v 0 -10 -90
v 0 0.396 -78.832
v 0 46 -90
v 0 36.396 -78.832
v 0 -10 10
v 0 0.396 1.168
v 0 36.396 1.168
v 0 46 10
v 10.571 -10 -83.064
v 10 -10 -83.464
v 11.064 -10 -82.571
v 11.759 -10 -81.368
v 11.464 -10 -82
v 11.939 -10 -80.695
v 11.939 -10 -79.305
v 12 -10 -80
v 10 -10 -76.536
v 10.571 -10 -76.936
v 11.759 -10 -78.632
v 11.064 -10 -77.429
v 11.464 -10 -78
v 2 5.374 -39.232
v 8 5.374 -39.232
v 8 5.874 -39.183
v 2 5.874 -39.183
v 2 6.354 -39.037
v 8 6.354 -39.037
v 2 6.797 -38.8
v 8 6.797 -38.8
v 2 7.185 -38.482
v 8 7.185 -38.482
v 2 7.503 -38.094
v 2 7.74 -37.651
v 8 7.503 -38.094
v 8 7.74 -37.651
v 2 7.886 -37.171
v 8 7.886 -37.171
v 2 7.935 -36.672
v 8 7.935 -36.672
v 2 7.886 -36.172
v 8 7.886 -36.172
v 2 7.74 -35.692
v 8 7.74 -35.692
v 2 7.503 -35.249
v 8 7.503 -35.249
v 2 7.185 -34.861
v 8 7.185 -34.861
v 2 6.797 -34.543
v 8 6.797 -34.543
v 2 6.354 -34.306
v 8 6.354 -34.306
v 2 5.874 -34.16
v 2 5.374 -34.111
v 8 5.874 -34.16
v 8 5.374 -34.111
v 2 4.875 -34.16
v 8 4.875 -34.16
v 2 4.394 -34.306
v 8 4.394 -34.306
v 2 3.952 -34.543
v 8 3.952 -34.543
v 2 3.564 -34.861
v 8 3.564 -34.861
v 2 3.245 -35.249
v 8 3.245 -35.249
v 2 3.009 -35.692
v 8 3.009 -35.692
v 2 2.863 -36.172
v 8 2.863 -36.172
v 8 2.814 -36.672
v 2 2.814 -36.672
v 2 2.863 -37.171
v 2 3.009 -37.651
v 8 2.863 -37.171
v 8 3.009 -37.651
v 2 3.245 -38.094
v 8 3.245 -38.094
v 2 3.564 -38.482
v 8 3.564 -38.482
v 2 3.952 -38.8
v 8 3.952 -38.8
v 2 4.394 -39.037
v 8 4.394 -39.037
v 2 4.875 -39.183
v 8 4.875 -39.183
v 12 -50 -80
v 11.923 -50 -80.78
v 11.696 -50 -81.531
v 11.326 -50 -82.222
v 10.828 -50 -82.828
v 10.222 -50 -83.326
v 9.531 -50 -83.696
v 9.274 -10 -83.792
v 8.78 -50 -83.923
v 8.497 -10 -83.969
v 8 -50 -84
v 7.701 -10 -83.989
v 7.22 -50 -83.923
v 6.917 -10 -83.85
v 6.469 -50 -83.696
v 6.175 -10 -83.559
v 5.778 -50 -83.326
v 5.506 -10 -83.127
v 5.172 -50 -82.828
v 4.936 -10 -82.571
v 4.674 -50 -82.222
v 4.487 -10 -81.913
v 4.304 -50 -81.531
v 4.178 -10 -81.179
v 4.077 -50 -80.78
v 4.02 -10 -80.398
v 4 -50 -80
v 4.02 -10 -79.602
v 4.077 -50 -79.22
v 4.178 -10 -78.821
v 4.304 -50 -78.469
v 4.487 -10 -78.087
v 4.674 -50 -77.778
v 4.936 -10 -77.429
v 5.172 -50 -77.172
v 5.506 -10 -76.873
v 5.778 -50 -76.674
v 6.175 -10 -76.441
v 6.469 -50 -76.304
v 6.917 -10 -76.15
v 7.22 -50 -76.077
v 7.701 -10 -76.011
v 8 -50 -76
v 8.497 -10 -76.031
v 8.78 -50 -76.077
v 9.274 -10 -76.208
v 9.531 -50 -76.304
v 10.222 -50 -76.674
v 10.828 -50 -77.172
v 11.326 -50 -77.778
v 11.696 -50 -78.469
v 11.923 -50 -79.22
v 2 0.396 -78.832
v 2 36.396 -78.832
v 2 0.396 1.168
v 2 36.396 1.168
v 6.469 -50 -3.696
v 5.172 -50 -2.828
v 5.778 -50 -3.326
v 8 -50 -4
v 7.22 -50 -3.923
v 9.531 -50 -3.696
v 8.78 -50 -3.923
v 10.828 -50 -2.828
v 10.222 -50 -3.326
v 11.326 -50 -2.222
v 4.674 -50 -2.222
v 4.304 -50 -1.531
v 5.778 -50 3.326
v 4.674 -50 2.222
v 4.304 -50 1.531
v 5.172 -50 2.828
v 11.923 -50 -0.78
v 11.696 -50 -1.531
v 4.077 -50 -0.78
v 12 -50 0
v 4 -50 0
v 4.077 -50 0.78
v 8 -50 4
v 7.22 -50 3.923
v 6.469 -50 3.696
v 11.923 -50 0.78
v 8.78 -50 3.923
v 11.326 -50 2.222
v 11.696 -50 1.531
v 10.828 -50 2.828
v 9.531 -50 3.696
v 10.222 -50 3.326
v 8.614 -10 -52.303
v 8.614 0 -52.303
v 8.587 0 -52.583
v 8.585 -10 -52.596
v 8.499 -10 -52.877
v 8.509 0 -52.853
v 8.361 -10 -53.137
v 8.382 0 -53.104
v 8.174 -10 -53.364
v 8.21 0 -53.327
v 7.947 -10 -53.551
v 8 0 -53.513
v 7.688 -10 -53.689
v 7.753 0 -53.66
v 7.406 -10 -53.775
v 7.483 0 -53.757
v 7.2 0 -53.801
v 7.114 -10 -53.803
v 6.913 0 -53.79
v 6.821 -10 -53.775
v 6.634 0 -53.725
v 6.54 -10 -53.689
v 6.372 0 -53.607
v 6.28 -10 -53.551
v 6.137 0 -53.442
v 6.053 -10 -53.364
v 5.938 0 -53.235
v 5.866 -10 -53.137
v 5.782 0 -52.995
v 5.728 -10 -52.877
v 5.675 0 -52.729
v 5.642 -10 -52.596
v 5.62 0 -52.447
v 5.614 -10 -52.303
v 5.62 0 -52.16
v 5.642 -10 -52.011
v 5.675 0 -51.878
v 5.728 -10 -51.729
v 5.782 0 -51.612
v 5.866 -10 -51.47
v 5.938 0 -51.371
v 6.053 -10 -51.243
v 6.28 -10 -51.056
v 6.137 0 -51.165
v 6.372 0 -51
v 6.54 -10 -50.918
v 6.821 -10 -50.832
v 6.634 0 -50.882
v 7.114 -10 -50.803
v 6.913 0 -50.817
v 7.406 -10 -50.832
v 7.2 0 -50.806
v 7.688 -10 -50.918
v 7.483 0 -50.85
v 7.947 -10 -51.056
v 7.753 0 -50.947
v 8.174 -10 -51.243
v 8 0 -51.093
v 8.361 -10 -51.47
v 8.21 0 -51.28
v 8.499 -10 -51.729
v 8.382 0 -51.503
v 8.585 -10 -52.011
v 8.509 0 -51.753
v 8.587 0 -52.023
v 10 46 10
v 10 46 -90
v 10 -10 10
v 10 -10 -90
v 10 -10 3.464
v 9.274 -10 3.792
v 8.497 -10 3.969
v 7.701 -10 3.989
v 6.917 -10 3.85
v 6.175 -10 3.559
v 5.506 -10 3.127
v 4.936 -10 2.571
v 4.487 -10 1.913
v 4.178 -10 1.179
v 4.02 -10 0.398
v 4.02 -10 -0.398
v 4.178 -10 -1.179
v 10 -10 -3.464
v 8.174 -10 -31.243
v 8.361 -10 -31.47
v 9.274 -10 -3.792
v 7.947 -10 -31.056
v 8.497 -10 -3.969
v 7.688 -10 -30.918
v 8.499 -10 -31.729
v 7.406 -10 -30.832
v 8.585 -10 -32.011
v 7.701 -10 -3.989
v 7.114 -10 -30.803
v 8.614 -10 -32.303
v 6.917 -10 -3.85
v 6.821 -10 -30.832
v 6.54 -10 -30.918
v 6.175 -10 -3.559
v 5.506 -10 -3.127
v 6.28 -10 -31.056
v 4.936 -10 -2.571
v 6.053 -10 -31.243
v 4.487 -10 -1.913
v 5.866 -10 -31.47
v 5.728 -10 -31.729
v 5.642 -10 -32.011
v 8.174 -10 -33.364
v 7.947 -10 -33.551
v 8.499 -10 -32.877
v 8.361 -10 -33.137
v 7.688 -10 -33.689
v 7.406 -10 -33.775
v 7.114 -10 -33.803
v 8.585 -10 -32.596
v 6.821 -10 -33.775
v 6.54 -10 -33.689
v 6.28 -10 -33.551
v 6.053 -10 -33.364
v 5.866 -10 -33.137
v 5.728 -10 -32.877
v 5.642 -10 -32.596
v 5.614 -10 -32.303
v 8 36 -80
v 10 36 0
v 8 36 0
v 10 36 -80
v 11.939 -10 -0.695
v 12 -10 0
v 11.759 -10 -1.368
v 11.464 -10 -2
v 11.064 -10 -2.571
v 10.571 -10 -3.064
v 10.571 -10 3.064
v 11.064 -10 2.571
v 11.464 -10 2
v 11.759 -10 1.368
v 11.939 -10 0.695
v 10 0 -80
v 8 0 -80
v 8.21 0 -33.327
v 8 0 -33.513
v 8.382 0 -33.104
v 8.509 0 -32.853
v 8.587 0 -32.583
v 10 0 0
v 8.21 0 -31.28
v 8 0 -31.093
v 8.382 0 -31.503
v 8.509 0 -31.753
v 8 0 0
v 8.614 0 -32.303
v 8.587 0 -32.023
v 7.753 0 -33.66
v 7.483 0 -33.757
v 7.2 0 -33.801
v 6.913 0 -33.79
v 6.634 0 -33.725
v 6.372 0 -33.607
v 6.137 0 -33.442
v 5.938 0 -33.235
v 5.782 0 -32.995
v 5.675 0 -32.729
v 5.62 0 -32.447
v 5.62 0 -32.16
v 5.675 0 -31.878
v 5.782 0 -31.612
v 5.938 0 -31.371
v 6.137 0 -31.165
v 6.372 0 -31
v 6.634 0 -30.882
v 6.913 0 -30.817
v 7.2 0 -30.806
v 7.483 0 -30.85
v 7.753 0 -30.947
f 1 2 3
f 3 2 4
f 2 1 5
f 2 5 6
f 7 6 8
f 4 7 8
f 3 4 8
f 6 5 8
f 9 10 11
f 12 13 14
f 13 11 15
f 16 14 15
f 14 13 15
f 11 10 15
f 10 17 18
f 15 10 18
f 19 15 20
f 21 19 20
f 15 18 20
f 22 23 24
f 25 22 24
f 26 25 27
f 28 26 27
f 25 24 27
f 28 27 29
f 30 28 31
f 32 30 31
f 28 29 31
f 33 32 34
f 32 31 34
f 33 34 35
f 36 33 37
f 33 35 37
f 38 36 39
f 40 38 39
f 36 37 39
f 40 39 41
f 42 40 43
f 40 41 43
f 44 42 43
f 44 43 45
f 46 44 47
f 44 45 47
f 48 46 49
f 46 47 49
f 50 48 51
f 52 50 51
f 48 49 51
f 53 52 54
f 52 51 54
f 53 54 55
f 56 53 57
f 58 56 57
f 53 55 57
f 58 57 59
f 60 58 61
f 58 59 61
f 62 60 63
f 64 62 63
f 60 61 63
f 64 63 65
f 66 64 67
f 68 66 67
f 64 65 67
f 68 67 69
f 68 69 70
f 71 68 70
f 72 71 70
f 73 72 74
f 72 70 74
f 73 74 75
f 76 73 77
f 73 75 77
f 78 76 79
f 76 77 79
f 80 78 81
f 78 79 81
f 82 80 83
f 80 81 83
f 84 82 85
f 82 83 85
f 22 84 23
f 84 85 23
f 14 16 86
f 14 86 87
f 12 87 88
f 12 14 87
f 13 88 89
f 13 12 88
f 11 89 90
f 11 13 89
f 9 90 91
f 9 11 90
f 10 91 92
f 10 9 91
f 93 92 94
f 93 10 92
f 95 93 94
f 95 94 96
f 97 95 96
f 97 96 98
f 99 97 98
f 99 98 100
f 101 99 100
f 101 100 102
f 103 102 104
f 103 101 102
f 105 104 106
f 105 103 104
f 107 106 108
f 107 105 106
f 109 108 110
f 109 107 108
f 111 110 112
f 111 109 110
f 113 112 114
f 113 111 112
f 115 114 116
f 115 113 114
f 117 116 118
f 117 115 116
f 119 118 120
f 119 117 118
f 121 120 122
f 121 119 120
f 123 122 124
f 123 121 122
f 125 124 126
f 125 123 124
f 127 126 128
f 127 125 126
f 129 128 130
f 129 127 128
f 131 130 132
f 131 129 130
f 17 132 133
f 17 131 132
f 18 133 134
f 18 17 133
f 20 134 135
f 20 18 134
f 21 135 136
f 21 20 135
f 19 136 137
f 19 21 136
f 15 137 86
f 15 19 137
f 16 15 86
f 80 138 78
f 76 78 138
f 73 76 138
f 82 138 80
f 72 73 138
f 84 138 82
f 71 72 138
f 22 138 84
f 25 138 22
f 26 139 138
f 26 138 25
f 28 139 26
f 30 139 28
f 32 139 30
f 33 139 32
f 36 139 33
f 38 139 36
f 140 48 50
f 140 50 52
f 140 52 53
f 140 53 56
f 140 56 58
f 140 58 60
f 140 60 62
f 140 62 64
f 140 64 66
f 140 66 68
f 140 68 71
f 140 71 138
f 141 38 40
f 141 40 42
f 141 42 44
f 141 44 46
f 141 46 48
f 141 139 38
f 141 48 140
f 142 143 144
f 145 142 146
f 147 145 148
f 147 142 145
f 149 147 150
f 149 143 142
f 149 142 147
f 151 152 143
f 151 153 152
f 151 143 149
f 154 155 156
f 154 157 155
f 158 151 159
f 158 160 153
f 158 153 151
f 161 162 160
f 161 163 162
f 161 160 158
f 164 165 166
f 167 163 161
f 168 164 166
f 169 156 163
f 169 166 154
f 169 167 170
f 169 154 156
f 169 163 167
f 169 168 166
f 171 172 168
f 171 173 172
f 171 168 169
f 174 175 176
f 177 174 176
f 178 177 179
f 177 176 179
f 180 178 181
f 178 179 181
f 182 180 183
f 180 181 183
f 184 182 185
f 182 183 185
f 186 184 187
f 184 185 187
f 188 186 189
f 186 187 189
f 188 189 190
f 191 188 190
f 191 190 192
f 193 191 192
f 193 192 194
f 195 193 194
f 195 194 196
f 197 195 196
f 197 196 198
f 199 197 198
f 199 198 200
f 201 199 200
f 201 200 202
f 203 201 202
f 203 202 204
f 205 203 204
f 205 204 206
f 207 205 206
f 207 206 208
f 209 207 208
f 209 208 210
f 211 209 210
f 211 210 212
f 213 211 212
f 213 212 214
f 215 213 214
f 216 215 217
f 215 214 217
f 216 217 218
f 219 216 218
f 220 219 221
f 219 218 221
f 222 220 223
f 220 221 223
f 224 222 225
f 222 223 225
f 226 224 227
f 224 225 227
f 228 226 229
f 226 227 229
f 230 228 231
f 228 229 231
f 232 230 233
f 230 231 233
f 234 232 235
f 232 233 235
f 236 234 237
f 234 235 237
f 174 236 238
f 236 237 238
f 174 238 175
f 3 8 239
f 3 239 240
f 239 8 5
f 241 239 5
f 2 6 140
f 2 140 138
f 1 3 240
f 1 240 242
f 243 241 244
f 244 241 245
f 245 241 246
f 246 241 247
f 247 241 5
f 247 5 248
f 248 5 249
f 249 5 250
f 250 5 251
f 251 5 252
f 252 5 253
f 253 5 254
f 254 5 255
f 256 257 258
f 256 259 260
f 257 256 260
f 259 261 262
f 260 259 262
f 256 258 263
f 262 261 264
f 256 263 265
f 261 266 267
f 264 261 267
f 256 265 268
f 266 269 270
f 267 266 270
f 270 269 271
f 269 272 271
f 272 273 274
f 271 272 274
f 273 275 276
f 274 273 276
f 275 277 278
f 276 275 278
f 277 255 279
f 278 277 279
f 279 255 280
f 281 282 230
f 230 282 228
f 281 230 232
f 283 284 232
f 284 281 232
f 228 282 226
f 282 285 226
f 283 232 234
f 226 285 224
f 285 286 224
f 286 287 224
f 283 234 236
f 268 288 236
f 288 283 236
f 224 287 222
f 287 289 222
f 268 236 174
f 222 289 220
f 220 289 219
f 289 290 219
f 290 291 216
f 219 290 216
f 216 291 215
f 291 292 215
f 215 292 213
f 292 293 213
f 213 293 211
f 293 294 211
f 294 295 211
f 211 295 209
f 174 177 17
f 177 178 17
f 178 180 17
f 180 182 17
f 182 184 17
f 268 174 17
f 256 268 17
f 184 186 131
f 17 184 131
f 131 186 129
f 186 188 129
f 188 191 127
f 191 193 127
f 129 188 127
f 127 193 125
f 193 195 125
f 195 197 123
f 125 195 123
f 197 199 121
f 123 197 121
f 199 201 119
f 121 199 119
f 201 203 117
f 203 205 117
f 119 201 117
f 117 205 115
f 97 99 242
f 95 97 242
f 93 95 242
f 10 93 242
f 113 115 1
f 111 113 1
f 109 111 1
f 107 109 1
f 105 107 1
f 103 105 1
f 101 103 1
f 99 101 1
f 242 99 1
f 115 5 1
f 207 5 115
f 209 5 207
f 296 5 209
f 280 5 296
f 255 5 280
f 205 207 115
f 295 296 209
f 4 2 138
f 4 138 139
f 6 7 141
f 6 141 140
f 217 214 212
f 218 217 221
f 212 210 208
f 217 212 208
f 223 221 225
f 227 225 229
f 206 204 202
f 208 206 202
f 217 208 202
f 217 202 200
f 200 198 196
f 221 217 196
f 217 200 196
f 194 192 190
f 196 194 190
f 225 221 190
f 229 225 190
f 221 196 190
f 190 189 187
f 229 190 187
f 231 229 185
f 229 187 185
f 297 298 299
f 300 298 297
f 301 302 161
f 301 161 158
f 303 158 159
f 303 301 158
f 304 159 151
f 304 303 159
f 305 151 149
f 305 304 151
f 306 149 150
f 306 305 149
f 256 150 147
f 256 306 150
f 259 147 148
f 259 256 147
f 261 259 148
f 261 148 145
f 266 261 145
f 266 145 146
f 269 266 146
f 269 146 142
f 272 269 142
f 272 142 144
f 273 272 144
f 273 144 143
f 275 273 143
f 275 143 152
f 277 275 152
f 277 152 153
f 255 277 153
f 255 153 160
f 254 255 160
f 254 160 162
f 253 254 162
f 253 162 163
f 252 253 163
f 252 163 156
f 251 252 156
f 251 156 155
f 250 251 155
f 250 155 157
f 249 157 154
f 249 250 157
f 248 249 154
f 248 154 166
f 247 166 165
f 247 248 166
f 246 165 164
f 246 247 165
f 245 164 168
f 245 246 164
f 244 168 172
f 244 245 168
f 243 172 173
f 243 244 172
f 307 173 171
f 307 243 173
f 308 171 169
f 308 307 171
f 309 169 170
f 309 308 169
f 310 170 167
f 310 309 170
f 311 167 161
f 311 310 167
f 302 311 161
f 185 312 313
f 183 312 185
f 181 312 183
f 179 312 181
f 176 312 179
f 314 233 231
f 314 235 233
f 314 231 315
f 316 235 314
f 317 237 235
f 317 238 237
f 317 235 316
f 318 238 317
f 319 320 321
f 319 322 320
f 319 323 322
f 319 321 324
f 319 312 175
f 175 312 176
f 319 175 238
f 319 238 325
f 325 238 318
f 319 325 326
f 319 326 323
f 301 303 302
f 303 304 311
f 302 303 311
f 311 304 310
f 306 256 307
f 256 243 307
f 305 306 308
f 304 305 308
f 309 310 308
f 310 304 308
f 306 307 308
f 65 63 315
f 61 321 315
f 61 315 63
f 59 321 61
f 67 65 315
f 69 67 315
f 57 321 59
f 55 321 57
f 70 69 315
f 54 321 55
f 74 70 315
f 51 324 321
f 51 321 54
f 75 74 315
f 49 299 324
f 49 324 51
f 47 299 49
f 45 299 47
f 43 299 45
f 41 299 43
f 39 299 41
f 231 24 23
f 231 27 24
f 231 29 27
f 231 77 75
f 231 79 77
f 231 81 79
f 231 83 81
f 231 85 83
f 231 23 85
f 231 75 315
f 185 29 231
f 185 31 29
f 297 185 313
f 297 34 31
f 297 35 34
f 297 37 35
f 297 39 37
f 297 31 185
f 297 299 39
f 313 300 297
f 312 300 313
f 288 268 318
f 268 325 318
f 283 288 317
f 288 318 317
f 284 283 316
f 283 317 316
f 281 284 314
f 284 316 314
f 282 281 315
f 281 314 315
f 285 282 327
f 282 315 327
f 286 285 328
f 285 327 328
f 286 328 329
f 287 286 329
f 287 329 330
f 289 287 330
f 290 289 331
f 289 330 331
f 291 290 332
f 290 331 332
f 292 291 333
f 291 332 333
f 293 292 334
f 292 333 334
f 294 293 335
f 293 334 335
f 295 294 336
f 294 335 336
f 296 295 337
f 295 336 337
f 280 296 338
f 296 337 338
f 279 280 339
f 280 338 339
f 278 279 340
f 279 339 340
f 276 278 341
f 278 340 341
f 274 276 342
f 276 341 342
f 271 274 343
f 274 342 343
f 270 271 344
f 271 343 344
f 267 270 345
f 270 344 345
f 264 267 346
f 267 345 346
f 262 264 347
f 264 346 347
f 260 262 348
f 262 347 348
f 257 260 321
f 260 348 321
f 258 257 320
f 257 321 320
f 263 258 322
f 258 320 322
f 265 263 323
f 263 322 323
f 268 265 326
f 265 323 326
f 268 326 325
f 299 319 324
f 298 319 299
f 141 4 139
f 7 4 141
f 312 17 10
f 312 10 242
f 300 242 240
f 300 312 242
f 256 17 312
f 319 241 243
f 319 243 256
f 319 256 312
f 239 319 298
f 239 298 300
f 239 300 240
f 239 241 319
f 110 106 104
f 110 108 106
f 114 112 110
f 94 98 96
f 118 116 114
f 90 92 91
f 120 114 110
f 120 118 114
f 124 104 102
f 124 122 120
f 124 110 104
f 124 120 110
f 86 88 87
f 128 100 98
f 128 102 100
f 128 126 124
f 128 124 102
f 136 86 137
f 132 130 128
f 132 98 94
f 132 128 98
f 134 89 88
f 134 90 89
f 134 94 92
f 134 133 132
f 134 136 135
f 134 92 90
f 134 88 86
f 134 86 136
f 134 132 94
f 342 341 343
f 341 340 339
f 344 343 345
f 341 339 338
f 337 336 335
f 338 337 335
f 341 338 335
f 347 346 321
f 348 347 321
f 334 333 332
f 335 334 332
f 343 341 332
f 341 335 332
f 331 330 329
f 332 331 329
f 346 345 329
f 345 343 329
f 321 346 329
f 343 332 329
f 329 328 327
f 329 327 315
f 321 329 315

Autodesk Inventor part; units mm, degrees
ref_plane "YZ Plane" through (0, 0, 0) normal (1, 0, 0) x (0, 1, 0)
ref_plane "XZ Plane" through (0, 0, 0) normal (0, 1, 0) x (-1, 0, 0)
ref_plane "XY Plane" through (0, 0, 0) normal (0, 0, 1) x (1, 0, 0)
sketch "Sketch1" plane through (0, 0, 0) normal (1, 0, 0) x (0, 1, 0)
  line L0 (46, 10) -> (-10, 10)
  line L1 (46, -90) -> (-10, -90)
  line L2 (46, 10) -> (46, -90)
  line L3 (-10, 10) -> (-10, -90)
  point P0 (0, 0)
  dimension "d4" = 100
extrude "Extrusion1" add sketch "Sketch1" along normal blind 10
sketch "Sketch2" plane through (10, 0, 0) normal (1, 0, 0) x (0, 0, -1)
  line L0 (0, 36) -> (80, 36)
  line L1 (80, 36) -> (80, 0)
  line L2 (80, 0) -> (0, 0)
  line L3 (0, 0) -> (0, 36)
  line L4 (90, 46) -> (-10, 46) projected
  line L5 (-10, -10) -> (90, -10) projected
  line L6 (-10, 46) -> (-10, -10) projected
  line L7 (90, -10) -> (90, 46) projected
  point P0 (0, 0)
  dimension "d9" = 80
  dimension "d10" = 36
  dimension "d11" = 10
  dimension "d12" = 10
  dimension "d13" = 10
  dimension "d14" = 10
extrude "Extrusion2" cut sketch "Sketch2" against normal blind 2 contours L0 L1 L2 L3
sketch "Sketch3" plane through (10, 0, 0) normal (0, 1, 0) x (1, 0, 0)
  circle A0 centre (-2.8864, 52.3034) radius 1.5
  circle A1 centre (-2.8864, 32.3034) radius 1.5
  line L0 (0, 80) -> (-2, 80) projected
  line L1 (0, 0) -> (-2, 0) projected
  point P0 (-10, 0)
  dimension "d17" = 3
  dimension "d18" = 3
  dimension "d19" = 20
  dimension "d20" = 27.6966
  dimension "d21" = 32.3034
extrude "Extrusion3" cut sketch "Sketch3" against normal through all
sketch "Sketch4" plane through (8, 0, 0) normal (1, 0, 0) x (0, 0, -1)
  circle A0 centre (36.6715, 5.3743) radius 2.5605
  point P0 (0, 0)
extrude "Extrusion4" cut sketch "Sketch4" against normal through all
sketch "Sketch5" plane through (0, -10, -90) normal (0, -1, 0) x (1, 0, 0)
  line L0 (8, 10) -> (8, 90) projected
  circle A0 centre (8, 90) radius 4
  line L1 (10, 10) -> (8, 10) projected
  circle A1 centre (8, 10) radius 4
  point P0 (0, 90)
  dimension "d26" = 8
  dimension "d27" = 8
extrude "Extrusion5" add sketch "Sketch5" along normal blind 40
sketch "Sketch6" plane through (0, -10, -90) normal (0, -1, 0) x (1, 0, 0)
  point P0 (0, 90)
sketch "Sketch8" plane through (0, -10, -90) normal (0, -1, 0) x (1, 0, 0)
  point P0 (0, 90)
sketch "Sketch9" plane through (10, 0, 0) normal (1, 0, 0) x (0, 0, -1)
  point P0 (0, 0)
sketch "Sketch10" plane through (0, 0, 0) normal (-1, 0, 0) x (0, 0, 1)
  line L0 (-78.8319, 36.3964) -> (1.1681, 36.3964)
  line L1 (1.1681, 36.3964) -> (1.1681, 0.3964)
  line L2 (1.1681, 0.3964) -> (-78.8319, 0.3964)
  line L3 (-78.8319, 0.3964) -> (-78.8319, 36.3964)
  point P0 (0, 0)
  dimension "d34" = 80
  dimension "d35" = 36
extrude "Extrusion7" cut sketch "Sketch10" against normal blind 2
properties part number "upper part edited" material "Polyethylene, High Density"
